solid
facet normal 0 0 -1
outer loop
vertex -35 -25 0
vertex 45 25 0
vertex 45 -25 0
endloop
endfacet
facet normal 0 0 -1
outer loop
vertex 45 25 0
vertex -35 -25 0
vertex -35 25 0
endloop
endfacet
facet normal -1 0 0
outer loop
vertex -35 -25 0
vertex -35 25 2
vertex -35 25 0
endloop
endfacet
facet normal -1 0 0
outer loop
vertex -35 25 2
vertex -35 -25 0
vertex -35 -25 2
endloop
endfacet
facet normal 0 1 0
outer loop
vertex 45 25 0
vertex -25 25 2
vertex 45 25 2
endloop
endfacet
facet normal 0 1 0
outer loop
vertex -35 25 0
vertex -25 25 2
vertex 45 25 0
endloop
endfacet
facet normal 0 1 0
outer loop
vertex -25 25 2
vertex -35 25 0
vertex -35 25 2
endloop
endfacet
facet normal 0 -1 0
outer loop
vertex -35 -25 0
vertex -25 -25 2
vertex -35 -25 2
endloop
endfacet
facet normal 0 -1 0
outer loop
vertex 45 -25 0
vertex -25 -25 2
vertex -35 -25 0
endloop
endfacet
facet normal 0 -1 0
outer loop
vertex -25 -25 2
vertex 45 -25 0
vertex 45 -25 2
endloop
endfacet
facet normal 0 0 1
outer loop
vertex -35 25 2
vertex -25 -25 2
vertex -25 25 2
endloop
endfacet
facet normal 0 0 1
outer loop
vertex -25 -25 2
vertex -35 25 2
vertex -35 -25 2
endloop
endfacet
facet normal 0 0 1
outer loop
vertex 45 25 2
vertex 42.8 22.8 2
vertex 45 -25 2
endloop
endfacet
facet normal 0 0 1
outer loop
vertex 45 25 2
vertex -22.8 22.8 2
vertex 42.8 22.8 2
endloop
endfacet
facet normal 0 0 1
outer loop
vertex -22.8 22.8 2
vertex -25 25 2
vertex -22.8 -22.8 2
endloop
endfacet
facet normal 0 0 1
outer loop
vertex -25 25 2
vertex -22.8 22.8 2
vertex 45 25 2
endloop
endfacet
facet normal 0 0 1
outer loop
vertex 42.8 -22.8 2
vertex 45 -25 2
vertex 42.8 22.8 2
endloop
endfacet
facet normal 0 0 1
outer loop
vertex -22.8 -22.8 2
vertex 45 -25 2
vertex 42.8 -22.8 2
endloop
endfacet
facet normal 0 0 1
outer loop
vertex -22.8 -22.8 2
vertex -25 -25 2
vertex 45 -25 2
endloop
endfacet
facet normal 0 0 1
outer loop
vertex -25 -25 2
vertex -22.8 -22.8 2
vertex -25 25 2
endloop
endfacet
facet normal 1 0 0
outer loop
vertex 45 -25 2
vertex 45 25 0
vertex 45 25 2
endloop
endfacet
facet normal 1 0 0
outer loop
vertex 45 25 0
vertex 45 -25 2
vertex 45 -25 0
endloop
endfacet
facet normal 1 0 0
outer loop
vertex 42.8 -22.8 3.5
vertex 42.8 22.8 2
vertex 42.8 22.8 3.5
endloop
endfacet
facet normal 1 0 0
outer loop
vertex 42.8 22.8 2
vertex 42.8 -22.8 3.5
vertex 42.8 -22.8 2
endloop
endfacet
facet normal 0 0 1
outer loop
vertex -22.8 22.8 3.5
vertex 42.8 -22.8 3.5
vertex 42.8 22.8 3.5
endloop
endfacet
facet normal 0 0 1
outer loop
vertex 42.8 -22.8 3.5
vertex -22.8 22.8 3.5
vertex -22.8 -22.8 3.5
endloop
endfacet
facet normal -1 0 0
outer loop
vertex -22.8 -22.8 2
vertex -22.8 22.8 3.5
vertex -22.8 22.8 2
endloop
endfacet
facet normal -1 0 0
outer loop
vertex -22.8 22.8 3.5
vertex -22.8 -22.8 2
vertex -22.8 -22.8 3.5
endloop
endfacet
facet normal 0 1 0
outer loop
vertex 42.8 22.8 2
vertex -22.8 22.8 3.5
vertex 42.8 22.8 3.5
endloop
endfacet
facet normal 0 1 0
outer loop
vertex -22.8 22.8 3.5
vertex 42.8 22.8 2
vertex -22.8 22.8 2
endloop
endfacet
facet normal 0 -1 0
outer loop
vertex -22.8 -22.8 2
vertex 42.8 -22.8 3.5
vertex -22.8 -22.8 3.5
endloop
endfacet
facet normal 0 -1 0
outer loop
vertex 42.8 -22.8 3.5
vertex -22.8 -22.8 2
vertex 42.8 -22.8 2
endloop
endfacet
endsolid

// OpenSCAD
// Two-part enclosure for small electronics board (e.g. Arduino-based temperature logger)
// Print orientation: box upright, lid upside down on the bed, 10 mm gap between them

// ---------------- Parameters ----------------
box_x      = 70;    // box outer size in X (mm)
box_y      = 50;    // box outer size in Y (mm)
box_z      = 30;    // box outer size in Z (mm)
box_wall   = 2;     // box wall thickness (mm)
box_floor  = 2;     // box floor thickness (mm)

lid_plate_x      = 70;    // lid plate size in X (mm)
lid_plate_y      = 50;    // lid plate size in Y (mm)
lid_plate_t      = 2;     // lid plate thickness (mm)

lip_outer_x      = 65.6;  // lip outer size in X (mm)
lip_outer_y      = 45.6;  // lip outer size in Y (mm)
lip_t            = 1.5;   // lip thickness (mm)
lip_height       = 4;     // lip height above plate (mm)

clearance        = 0.2;   // clearance between lip inner size and box opening (mm)
gap              = 10;    // gap between box and lid (mm)
eps              = 0.5;   // cutter overshoot past faces (mm)

$fn = 64;

// Derived
lip_inner_x = lip_outer_x - 2 * clearance;   // 65.2 mm
lip_inner_y = lip_outer_y - 2 * clearance;   // 45.2 mm

// ---------------- Model ----------------
union() {
    // Part 1: Box (open top)
    translate([-box_x / 2, -box_y / 2, 0])
        difference() {
            cube([box_x, box_y, box_z]);
            translate([0, 0, box_floor])
                cube([box_x, box_y, box_z - box_floor + eps]);   // open-top cut
        }

    // Part 2: Lid (plate with lip), printed upside down
    translate([gap, 0, 0])
        union() {
            // Plate lying on the bed
            translate([-lid_plate_x / 2, -lid_plate_y / 2, 0])
                cube([lid_plate_x, lid_plate_y, lid_plate_t]);

            // Lip on top of the plate (extends above it)
            translate([-lip_outer_x / 2, -lip_outer_y / 2, lid_plate_t])
                cube([lip_outer_x, lip_outer_y, lip_t]);
        }
}
